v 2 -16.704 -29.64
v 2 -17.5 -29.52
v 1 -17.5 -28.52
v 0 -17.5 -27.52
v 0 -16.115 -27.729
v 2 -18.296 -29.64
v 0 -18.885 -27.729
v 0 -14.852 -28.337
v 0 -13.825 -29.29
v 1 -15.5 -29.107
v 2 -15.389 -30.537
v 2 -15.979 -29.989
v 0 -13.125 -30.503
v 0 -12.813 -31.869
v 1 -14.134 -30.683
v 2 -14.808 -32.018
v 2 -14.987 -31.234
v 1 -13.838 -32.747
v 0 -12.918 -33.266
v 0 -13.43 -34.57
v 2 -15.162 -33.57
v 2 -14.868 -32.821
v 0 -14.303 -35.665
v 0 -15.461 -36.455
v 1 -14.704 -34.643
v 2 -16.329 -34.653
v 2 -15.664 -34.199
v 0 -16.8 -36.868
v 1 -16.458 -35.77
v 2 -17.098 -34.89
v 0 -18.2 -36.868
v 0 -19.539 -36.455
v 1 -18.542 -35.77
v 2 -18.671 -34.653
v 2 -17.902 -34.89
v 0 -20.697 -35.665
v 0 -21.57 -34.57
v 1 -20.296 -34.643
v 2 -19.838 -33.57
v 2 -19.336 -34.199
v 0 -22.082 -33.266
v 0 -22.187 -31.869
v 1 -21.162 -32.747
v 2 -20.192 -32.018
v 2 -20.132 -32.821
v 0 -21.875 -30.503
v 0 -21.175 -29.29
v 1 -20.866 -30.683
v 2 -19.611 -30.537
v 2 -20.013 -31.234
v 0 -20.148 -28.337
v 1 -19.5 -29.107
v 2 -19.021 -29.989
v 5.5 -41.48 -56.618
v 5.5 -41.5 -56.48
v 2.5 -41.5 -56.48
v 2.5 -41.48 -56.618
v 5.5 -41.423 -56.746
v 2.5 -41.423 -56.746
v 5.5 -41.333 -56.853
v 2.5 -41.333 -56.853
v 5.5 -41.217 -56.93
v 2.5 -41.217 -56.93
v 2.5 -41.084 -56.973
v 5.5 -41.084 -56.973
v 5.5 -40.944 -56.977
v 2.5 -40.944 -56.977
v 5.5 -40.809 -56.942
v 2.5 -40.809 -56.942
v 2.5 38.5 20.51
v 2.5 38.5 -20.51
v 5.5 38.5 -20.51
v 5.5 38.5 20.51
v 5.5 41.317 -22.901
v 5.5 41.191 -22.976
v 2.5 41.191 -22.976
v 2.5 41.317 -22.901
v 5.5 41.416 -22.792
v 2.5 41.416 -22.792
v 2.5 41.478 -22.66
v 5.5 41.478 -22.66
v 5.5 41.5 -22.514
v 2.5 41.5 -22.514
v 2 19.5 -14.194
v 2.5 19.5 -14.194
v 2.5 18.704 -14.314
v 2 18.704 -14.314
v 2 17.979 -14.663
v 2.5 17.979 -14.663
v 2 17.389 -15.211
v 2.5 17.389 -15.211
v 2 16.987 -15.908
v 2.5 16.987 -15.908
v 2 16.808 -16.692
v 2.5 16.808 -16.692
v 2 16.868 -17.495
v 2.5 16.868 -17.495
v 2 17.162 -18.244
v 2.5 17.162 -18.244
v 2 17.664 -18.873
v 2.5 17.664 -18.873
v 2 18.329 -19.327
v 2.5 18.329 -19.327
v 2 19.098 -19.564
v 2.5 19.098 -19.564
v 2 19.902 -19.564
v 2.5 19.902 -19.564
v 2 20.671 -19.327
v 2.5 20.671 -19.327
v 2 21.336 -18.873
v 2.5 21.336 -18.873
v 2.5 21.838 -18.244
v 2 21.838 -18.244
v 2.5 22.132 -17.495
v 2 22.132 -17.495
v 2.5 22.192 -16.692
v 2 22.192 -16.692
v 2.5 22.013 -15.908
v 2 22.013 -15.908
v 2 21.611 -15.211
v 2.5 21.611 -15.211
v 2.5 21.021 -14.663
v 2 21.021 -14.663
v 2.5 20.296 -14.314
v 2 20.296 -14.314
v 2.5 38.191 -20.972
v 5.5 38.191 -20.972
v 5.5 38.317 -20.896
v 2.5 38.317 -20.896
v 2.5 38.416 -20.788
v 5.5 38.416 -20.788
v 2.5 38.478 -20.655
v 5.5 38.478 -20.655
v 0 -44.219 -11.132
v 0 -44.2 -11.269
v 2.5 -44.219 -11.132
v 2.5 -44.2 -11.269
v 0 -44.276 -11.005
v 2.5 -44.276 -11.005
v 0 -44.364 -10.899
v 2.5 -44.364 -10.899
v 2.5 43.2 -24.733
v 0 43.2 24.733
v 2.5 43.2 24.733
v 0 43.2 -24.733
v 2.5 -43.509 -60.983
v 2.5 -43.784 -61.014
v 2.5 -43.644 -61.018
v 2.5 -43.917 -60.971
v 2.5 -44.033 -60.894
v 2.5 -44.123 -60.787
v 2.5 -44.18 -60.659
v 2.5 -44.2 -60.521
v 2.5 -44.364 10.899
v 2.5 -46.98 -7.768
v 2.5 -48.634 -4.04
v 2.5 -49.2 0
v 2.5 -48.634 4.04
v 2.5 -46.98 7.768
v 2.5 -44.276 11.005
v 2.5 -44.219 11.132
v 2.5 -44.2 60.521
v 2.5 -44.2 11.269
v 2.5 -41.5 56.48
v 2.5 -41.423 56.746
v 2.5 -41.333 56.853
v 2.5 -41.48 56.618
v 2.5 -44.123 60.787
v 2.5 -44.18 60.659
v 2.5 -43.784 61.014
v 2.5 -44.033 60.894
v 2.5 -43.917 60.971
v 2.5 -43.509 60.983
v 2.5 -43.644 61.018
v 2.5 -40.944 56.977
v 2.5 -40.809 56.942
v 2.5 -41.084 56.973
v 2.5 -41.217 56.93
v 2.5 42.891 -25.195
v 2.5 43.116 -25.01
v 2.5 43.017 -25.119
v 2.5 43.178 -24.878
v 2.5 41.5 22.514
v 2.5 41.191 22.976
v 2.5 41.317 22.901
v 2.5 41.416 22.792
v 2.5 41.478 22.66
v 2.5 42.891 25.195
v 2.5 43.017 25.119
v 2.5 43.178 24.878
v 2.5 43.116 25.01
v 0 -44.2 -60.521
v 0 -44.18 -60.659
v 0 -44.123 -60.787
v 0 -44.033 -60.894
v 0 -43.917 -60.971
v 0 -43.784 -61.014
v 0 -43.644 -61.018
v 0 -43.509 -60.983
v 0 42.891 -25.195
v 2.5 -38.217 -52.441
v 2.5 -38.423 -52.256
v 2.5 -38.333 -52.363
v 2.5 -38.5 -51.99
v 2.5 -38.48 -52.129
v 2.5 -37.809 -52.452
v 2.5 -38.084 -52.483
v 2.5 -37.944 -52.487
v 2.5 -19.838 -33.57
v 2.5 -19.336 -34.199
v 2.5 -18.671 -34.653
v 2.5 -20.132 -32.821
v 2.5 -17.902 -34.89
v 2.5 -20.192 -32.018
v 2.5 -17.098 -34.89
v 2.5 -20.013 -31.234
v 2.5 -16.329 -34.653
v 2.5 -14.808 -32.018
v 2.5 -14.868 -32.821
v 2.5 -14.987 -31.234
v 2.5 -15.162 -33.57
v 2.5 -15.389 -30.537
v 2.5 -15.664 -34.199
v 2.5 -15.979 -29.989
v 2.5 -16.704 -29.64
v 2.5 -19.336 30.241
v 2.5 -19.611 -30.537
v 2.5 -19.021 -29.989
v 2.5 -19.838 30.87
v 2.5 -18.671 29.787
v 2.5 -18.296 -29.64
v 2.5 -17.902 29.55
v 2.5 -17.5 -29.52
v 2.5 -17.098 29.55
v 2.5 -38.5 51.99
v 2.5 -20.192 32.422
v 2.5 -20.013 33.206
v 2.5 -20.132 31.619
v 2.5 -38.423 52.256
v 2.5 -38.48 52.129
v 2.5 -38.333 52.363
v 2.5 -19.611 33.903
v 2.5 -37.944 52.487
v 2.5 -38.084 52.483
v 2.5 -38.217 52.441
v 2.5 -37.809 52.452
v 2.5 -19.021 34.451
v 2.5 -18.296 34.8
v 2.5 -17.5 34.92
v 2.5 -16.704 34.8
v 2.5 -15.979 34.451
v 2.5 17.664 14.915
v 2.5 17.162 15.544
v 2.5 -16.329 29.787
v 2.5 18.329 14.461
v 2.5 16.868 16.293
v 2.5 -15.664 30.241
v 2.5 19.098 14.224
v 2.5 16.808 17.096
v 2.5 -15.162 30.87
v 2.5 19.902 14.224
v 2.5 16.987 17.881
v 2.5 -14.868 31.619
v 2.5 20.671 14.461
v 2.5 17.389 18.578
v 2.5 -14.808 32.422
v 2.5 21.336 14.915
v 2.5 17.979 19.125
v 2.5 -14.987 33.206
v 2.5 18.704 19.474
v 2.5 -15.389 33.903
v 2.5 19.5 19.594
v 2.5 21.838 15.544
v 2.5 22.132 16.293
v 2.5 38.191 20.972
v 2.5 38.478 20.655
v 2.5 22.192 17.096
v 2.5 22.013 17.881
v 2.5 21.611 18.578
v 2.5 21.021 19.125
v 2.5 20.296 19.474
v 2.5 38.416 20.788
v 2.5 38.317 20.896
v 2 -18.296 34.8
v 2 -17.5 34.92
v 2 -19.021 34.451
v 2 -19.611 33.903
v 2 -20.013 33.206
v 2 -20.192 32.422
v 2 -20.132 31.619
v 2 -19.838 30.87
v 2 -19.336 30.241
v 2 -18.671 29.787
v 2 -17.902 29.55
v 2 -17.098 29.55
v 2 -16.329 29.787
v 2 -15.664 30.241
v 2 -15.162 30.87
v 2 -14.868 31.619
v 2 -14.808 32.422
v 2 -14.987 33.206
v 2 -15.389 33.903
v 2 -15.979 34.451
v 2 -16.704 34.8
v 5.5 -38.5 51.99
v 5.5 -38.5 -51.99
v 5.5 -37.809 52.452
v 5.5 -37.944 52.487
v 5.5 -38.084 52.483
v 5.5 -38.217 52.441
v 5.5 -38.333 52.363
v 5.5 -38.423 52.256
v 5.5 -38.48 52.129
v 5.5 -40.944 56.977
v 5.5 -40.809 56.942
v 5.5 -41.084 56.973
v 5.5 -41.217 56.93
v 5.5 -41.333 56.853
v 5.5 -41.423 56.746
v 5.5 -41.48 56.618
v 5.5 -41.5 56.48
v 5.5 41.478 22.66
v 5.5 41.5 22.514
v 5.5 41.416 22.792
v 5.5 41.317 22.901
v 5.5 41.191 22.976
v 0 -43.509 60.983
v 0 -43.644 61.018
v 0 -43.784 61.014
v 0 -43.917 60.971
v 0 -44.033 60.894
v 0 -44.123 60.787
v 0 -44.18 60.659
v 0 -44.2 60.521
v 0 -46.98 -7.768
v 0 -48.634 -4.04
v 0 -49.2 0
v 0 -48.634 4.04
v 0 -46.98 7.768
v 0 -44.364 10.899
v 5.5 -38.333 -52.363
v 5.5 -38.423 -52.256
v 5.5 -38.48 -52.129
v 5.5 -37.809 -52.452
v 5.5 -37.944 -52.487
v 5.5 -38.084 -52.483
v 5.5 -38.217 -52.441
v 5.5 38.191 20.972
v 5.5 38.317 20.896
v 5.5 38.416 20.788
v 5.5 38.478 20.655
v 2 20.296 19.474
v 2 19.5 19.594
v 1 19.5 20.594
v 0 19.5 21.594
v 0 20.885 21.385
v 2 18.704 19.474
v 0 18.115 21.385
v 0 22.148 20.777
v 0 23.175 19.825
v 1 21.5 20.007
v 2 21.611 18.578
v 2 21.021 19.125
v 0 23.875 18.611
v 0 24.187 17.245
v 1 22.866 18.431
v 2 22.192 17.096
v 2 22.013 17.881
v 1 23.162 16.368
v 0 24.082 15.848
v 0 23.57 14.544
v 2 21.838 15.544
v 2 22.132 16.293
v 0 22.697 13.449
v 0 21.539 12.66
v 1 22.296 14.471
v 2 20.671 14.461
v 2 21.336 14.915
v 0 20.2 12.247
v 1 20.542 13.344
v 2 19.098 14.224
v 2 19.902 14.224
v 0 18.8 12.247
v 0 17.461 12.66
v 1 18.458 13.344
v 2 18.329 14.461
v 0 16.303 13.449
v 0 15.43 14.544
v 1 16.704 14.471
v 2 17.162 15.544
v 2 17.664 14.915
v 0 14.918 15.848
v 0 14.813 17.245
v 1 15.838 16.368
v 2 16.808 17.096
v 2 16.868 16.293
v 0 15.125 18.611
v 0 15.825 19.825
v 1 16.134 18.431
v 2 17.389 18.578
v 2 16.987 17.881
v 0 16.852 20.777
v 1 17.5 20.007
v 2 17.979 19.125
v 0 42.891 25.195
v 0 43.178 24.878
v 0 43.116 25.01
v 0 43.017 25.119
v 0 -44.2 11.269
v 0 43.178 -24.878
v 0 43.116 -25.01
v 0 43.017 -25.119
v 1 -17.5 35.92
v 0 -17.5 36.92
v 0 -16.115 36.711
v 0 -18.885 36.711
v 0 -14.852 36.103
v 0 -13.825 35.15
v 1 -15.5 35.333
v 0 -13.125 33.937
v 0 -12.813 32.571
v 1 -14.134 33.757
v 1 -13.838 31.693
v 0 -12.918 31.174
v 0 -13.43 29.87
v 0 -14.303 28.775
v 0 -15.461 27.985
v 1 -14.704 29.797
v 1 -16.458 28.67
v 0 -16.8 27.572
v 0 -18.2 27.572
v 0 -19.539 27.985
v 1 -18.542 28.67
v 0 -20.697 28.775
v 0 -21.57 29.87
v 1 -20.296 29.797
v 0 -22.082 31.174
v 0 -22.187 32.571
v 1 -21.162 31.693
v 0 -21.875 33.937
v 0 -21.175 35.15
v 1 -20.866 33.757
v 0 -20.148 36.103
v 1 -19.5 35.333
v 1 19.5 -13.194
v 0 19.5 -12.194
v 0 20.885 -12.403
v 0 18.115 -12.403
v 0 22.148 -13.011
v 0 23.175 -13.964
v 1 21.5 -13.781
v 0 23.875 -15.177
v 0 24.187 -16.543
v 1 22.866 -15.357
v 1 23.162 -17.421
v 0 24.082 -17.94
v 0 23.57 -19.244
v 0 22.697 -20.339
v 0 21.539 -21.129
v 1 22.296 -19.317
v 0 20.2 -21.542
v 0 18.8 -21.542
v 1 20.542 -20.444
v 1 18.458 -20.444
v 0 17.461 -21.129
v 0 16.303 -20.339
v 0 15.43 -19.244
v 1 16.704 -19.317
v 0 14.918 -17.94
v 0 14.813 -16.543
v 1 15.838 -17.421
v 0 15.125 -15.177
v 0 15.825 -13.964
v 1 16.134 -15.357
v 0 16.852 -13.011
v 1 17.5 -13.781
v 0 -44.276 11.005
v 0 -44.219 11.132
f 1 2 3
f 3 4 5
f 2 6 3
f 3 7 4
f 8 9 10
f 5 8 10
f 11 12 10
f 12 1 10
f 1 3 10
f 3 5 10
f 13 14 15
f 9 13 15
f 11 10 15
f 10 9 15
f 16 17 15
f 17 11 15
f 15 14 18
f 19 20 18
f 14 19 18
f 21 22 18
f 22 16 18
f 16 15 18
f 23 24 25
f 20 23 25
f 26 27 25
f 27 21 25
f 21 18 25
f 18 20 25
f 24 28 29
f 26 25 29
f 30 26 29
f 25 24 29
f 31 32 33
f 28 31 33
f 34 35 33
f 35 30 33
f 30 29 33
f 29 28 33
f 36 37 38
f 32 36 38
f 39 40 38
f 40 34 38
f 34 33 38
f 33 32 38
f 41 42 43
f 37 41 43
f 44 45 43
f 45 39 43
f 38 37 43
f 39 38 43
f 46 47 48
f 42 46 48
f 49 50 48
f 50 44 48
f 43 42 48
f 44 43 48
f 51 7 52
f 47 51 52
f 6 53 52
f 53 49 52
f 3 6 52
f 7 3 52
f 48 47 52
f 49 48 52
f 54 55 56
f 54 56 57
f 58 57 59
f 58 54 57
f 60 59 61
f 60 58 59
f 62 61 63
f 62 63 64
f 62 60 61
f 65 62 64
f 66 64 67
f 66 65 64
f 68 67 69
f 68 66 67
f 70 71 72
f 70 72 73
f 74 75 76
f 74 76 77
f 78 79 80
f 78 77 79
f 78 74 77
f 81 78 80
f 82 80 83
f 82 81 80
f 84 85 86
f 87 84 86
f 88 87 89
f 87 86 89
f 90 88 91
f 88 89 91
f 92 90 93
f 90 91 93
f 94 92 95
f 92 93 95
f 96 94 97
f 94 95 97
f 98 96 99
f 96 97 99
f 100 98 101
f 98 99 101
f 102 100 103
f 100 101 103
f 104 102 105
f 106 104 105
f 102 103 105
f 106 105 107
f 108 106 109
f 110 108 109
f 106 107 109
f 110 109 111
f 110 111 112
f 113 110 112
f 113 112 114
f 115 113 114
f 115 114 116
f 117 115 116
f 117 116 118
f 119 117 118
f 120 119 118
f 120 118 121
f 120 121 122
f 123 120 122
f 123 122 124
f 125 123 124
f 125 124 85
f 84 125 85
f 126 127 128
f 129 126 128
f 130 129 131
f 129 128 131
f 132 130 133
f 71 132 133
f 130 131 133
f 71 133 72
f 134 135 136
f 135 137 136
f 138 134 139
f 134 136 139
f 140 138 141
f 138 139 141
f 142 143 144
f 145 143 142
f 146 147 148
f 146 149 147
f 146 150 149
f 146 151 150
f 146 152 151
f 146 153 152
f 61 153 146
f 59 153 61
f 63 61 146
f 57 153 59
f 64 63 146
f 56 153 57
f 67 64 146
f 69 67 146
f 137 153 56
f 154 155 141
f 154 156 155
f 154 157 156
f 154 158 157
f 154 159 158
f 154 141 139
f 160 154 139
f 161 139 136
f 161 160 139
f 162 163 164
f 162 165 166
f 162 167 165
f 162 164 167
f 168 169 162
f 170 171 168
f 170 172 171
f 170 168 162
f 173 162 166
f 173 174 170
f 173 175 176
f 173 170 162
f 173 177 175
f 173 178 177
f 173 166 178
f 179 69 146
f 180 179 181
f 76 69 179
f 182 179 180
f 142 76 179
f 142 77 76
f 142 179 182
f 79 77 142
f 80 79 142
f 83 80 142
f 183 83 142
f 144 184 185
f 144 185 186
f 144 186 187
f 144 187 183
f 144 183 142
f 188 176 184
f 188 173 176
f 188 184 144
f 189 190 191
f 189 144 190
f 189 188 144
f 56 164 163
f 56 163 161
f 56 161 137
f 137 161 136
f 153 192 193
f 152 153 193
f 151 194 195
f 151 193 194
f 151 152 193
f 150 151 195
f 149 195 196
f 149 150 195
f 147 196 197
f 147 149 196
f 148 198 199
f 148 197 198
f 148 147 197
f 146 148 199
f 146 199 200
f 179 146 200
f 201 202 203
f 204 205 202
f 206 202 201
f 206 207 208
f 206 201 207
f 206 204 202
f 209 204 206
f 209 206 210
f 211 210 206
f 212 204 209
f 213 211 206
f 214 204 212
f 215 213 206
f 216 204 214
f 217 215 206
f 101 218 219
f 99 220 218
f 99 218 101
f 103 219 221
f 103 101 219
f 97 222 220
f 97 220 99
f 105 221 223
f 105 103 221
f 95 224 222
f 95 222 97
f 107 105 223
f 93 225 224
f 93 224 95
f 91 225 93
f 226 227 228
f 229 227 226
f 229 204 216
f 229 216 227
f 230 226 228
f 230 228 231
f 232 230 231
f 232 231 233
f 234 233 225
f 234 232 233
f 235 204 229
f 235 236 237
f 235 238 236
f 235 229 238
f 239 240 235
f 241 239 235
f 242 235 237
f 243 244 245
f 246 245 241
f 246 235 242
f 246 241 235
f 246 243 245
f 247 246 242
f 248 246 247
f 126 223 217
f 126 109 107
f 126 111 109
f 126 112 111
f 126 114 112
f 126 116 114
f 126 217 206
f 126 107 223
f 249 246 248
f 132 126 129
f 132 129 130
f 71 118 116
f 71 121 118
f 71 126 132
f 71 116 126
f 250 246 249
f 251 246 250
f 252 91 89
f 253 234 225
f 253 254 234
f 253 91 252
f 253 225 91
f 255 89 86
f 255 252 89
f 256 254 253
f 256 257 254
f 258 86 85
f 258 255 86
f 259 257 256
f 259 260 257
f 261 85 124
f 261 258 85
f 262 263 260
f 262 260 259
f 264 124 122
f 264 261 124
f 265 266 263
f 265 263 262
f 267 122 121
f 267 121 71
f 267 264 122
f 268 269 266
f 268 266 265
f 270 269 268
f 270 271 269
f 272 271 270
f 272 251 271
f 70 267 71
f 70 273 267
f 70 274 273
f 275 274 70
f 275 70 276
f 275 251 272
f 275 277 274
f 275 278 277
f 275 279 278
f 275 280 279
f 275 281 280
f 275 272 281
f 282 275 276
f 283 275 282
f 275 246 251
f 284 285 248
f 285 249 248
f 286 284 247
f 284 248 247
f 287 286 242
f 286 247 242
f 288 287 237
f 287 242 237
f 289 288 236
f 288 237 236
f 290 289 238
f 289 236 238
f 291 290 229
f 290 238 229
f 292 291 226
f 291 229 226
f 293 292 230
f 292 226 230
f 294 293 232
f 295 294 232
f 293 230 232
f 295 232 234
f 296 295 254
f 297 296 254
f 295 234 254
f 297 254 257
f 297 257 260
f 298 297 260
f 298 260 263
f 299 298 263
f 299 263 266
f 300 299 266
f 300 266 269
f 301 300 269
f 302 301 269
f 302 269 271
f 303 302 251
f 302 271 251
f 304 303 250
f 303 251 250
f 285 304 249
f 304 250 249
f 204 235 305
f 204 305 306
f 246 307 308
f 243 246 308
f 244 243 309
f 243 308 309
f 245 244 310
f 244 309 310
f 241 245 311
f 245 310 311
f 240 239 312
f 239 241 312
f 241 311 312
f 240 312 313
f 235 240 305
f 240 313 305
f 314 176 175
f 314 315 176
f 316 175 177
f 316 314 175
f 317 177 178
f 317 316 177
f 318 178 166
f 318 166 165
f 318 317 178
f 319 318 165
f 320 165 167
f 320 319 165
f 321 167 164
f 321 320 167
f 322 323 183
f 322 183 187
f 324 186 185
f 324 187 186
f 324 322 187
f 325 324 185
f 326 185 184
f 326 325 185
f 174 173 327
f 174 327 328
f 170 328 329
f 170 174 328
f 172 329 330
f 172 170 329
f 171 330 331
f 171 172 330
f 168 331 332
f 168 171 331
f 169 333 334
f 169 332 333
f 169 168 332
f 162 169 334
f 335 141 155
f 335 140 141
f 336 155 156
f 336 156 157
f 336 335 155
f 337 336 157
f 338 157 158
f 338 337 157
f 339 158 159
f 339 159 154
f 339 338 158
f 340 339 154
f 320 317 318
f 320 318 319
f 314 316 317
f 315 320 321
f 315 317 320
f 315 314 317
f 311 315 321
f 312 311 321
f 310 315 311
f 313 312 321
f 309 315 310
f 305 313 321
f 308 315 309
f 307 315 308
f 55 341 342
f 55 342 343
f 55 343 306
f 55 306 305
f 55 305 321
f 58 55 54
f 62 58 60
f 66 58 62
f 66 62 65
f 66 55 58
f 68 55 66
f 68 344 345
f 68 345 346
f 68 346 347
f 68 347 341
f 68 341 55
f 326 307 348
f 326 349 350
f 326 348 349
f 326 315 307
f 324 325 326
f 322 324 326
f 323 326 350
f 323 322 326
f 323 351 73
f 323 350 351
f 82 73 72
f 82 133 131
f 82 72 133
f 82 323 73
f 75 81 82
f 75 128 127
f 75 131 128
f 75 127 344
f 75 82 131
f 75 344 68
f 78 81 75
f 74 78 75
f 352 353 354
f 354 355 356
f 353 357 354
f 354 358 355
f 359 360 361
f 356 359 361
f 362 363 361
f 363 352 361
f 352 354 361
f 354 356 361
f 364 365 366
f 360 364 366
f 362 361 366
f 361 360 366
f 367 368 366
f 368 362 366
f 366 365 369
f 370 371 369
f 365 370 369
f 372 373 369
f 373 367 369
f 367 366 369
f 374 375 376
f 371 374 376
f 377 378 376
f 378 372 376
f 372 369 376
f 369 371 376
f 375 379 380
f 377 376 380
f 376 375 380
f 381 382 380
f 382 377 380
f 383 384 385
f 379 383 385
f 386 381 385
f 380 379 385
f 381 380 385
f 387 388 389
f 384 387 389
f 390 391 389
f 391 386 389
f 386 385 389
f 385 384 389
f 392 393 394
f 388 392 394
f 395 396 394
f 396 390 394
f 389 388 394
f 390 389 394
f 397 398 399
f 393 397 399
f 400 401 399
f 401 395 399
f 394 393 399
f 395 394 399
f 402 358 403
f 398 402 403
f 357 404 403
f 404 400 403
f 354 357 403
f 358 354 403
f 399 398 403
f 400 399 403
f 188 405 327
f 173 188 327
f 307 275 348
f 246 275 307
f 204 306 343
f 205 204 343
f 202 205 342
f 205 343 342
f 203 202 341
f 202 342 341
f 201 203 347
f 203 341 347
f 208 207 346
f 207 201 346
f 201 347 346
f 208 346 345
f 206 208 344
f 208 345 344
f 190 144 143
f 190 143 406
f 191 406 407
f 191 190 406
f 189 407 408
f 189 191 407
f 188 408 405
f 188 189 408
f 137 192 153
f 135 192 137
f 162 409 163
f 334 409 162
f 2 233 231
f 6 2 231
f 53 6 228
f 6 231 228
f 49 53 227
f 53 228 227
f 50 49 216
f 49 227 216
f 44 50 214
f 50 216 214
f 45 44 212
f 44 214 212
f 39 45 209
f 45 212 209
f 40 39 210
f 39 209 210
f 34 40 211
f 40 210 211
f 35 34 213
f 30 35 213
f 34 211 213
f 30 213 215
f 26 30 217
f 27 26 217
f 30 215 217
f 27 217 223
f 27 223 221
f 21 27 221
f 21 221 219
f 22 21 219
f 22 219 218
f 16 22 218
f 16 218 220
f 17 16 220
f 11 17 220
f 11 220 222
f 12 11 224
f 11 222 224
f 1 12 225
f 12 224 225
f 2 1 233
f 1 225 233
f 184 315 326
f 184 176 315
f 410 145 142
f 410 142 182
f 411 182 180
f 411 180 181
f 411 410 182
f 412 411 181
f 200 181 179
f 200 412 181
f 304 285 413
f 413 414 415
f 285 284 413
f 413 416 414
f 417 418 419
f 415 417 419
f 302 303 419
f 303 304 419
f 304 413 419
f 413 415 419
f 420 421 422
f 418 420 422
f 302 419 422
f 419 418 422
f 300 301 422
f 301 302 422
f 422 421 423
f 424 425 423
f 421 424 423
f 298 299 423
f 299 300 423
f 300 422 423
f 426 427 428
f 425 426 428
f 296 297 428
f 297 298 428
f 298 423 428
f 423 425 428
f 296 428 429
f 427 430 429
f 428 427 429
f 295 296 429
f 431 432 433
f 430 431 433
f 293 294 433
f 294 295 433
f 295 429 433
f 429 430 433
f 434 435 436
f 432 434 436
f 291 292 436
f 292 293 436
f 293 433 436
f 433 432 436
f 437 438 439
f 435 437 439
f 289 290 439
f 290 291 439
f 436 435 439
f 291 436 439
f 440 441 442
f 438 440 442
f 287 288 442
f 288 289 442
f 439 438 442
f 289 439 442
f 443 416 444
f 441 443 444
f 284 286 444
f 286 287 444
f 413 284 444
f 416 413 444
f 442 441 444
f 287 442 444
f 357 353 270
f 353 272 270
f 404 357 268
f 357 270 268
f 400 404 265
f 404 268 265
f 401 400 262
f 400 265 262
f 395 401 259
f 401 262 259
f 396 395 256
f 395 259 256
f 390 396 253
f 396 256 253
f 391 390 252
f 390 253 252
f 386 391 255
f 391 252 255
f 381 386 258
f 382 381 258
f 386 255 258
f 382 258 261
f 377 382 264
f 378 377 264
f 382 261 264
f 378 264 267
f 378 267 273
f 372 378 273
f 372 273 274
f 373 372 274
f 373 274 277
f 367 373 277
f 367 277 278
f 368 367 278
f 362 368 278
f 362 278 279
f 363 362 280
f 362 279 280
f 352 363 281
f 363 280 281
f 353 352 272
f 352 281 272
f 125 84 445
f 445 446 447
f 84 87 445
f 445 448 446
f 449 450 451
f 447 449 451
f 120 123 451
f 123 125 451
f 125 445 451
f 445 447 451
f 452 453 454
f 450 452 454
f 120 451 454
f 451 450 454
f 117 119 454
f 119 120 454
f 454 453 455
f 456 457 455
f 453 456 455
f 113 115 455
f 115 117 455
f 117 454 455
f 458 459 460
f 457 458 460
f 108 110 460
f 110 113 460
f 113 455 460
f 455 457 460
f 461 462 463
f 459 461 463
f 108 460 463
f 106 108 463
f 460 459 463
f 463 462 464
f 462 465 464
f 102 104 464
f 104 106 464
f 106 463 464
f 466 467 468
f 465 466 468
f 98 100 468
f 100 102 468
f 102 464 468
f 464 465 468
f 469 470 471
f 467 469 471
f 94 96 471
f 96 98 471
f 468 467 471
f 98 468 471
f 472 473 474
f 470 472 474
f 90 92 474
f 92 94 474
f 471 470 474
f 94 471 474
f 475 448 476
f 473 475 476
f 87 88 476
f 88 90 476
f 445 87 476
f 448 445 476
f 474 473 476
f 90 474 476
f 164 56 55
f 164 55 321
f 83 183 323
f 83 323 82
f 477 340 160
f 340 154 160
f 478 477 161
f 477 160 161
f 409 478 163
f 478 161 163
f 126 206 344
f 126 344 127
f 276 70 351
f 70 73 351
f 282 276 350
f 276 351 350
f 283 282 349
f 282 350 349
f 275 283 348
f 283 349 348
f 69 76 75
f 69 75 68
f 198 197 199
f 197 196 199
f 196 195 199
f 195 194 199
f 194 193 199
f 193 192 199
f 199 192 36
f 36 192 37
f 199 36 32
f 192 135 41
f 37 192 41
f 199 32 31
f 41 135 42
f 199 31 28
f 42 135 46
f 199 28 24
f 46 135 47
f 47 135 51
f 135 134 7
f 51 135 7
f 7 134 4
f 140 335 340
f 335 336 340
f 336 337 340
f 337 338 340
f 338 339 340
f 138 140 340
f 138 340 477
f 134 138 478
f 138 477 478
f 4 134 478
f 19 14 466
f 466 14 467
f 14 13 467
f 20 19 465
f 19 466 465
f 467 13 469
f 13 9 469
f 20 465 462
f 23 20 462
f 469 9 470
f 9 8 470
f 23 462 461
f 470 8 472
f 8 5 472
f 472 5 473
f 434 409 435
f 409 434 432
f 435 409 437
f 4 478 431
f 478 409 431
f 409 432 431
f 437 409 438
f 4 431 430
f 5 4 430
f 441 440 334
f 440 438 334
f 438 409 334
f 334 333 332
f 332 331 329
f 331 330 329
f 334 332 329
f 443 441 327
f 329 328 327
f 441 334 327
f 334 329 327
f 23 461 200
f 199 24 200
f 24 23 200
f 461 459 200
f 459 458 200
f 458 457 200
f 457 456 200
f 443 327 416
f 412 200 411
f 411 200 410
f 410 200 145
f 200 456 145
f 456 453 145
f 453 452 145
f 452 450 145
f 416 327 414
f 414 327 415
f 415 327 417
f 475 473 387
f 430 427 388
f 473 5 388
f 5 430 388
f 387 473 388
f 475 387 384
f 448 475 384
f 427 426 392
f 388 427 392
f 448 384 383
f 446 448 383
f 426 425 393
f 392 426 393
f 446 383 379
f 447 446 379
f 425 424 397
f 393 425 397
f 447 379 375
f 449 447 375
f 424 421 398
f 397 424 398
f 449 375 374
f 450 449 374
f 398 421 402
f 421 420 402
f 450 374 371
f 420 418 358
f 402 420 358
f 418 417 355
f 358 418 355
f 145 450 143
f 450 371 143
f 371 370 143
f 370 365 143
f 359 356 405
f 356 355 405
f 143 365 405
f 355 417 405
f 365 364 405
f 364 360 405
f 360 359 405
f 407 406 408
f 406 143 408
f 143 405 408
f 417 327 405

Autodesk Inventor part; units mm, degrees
ref_plane "YZ Plane" through (0, 0, 0) normal (1, 0, 0) x (0, 1, 0)
ref_plane "XZ Plane" through (0, 0, 0) normal (0, 1, 0) x (-1, 0, 0)
sketch "Skizze4" plane through (0, 0, 0) normal (1, 0, 0) x (0, 1, 0)
  line L0 (44.5, 24.853) -> (-44.5, 61.718)
  line L1 (-44.5, 61.718) -> (-44.5, -61.718)
  line L2 (-44.5, -61.718) -> (44.5, -24.853)
  line L3 (44.5, -24.853) -> (44.5, 24.853)
  line L4 (0, -86.4052) -> (0, 86.4052) construction
  line L5 (-62.3, 0) -> (62.3, 0) construction
  dimension "d34" = 89
  dimension "d37" = 112.5
  dimension "d38" = 49.706
extrude "Extrusion2" add sketch "Skizze4" along normal blind 2.5
sketch "Skizze5" plane through (2.5, 0, 0) normal (1, 0, 0) x (0, 0, -1)
  line L0 (-61.718, -44.5) -> (61.718, -44.5) construction
  line L1 (61.718, -44.5) -> (24.853, 44.5) construction
  line L2 (24.853, 44.5) -> (-24.853, 44.5) construction
  line L3 (-24.853, 44.5) -> (-61.718, -44.5) construction
  line L4 (-22.8485, 41.5) -> (22.8485, 41.5)
  line L5 (22.8485, 41.5) -> (57.2282, -41.5)
  line L6 (57.2282, -41.5) -> (-57.2282, -41.5)
  line L7 (-57.2282, -41.5) -> (-22.8485, 41.5)
  line L8 (20.8439, 38.5) -> (-20.8439, 38.5)
  line L9 (-20.8439, 38.5) -> (-52.7384, -38.5)
  line L10 (-52.7384, -38.5) -> (52.7384, -38.5)
  line L11 (52.7384, -38.5) -> (20.8439, 38.5)
  point P0 (0, 0)
  dimension "d8" = 3
  dimension "d9" = 3
extrude "Extrusion3" add sketch "Skizze5" along normal blind 3
sketch "Skizze6" plane through (0, 0, 0) normal (-1, 0, 0) x (0, 0, 1)
  line L0 (24.853, 44.5) -> (-24.853, 44.5) construction
  line L1 (61.718, -44.5) -> (24.853, 44.5) construction
  line L2 (-24.853, 44.5) -> (24.853, 44.5) projected
  line L3 (0, 57.3) -> (0, -53.3) construction
  line L4 (-61.718, -44.5) -> (61.718, -44.5) construction
  arc A0 (-11.1803, -44.5) -> (11.1803, -44.5) centre (0, -34.5) ccw
  line L5 (-11.1803, -44.5) -> (11.1803, -44.5)
  dimension "d35" = 15
  dimension "d36" = 10
extrude "Extrusion4" add sketch "Skizze6" against normal up to surface (2.5 mm away)
sketch "Skizze8" plane through (0, 0, 0) normal (-1, 0, 0) x (0, 0, 1)
  circle A0 centre (0, 56.5) radius 2 construction
  line L0 (-61.718, -44.5) -> (-11.1803, -44.5) construction
  arc A1 (-11.1803, -44.5) -> (11.1803, -44.5) centre (0, -34.5) ccw construction
  line L1 (11.1803, -44.5) -> (61.718, -44.5) construction
  line L2 (61.718, -44.5) -> (24.853, 44.5) construction
  line L3 (24.853, 44.5) -> (-24.853, 44.5) construction
  line L4 (-24.853, 44.5) -> (-61.718, -44.5) construction
  line L5 (0, -71.1) -> (0, 80.1) construction
  line L6 (-86.4052, 0) -> (86.4052, 0) construction
  line L7 (-16.8941, 19.5) -> (16.8941, 19.5) construction
  line L8 (-32.22, -17.5) -> (32.22, -17.5) construction
  line L9 (32.22, -17.5) -> (16.8941, 19.5) construction
  line L10 (-16.8941, 19.5) -> (-32.22, -17.5) construction
  point P0 (0, 0)
  dimension "d42" = 37
  dimension "d53" = 112.5
  dimension "d54" = 25
hole "Bohrung2" at (0, 19.5, -16.8941) at (0, -17.5, -32.22) at (0, -17.5, 32.22) at (0, 19.5, 16.8941) direction (1, 0, 0) diameter 5.4 end through all
chamfer "Fase2" distance 2 angle 45 4 edges at (0, -17.5, -34.92) (0, 19.5, -19.5941) (0, -17.5, 29.52) (0, 19.5, 14.1941)
sketch "Skizze9" plane through (0, 0, 0) normal (-1, 0, 0) x (0, 0, 1)
  line L0 (61.718, -44.5) -> (24.853, 44.5) projected
  line L1 (11.1803, -44.5) -> (61.718, -44.5) projected
  line L2 (-61.718, -44.5) -> (-11.1803, -44.5) projected
  line L3 (-24.853, 44.5) -> (-61.718, -44.5) projected
  line L4 (24.853, 44.5) -> (-24.853, 44.5) projected
  line L5 (-11.1803, -44.2) -> (-61.269, -44.2)
  line L6 (-61.269, -44.2) -> (-24.6525, 44.2)
  line L7 (-24.6525, 44.2) -> (24.6525, 44.2)
  line L8 (24.6525, 44.2) -> (61.269, -44.2)
  line L9 (61.269, -44.2) -> (11.1803, -44.2)
  arc A0 (-11.1803, -44.5) -> (11.1803, -44.5) centre (0, -34.5) ccw projected
  line L10 (11.0454, -44.2) -> (61.269, -44.2)
  line L11 (61.269, -44.2) -> (24.6525, 44.2)
  line L12 (24.6525, 44.2) -> (-24.6525, 44.2)
  line L13 (-24.6525, 44.2) -> (-61.269, -44.2)
  line L14 (-61.269, -44.2) -> (-11.0454, -44.2)
  arc A1 (-11.0454, -44.2) -> (11.0454, -44.2) centre (0, -34.5) ccw
  point P0 (0, 0)
  dimension "d55" = 0.3
  dimension "d56" = 0.3
ref_plane "Arbeitsebene1" through (2.5, -44.2, -61.269) normal (-1, 0, 0) x (0, 0, 1)
extrude "Extrusion5" cut sketch "Skizze9" against normal up to surface (2.5 mm away)
sketch "Skizze10" plane through (0, 0, 0) normal (-1, 0, 0) x (0, 0, 1)
  line L0 (-24.6525, 44.2) -> (-61.269, -44.2) construction
  line L1 (-61.269, -44.2) -> (-11.0454, -44.2) construction
  arc A0 (-11.0454, -44.2) -> (11.0454, -44.2) centre (0, -34.5) ccw construction
  line L2 (11.0454, -44.2) -> (61.269, -44.2) construction
  line L3 (61.269, -44.2) -> (24.6525, 44.2) construction
  line L4 (24.6525, 44.2) -> (-24.6525, 44.2) construction
  circle A1 centre (-32.22, -17.5) radius 4.7 construction
  circle A2 centre (-16.8941, 19.5) radius 4.7 construction
  circle A3 centre (16.8941, 19.5) radius 4.7 construction
  circle A4 centre (32.22, -17.5) radius 4.7 construction
  line L5 (-25.0668, 44.2) -> (25.0668, 44.2)
  line L6 (25.0668, 44.2) -> (25.0668, 43.2)
  line L7 (25.0668, 43.2) -> (-25.0668, 43.2)
  line L8 (-25.0668, 43.2) -> (-25.0668, 44.2)
  line L9 (24.6525, 44.2) -> (-24.6525, 44.2) projected
  line L10 (24.6525, 44.2) -> (61.269, -44.2) projected
  point P0 (0, 0)
  dimension "d59" = 1
extrude "Extrusion6" cut sketch "Skizze10" against normal up to surface (2.5 mm away)
fillet "Rundung1" radius 0.5 14 edges at (1.25, 43.2, 25.0668) (1.25, 43.2, -25.0668) (1.25, -44.2, -61.269) (1.25, -44.2, 61.269) (4, -41.5, 57.2282) (4, -41.5, -57.2282) (4, 41.5, -22.8485) (4, 41.5, 22.8485) (4, -38.5, -52.7384) (4, 38.5, -20.8439) (4, 38.5, 20.8439) (4, -38.5, 52.7384) (1.25, -44.2, 11.0454) (1.25, -44.2, -11.0454)
properties part number "Modul Deckel" material "PC/ABS-Kunststoff"
